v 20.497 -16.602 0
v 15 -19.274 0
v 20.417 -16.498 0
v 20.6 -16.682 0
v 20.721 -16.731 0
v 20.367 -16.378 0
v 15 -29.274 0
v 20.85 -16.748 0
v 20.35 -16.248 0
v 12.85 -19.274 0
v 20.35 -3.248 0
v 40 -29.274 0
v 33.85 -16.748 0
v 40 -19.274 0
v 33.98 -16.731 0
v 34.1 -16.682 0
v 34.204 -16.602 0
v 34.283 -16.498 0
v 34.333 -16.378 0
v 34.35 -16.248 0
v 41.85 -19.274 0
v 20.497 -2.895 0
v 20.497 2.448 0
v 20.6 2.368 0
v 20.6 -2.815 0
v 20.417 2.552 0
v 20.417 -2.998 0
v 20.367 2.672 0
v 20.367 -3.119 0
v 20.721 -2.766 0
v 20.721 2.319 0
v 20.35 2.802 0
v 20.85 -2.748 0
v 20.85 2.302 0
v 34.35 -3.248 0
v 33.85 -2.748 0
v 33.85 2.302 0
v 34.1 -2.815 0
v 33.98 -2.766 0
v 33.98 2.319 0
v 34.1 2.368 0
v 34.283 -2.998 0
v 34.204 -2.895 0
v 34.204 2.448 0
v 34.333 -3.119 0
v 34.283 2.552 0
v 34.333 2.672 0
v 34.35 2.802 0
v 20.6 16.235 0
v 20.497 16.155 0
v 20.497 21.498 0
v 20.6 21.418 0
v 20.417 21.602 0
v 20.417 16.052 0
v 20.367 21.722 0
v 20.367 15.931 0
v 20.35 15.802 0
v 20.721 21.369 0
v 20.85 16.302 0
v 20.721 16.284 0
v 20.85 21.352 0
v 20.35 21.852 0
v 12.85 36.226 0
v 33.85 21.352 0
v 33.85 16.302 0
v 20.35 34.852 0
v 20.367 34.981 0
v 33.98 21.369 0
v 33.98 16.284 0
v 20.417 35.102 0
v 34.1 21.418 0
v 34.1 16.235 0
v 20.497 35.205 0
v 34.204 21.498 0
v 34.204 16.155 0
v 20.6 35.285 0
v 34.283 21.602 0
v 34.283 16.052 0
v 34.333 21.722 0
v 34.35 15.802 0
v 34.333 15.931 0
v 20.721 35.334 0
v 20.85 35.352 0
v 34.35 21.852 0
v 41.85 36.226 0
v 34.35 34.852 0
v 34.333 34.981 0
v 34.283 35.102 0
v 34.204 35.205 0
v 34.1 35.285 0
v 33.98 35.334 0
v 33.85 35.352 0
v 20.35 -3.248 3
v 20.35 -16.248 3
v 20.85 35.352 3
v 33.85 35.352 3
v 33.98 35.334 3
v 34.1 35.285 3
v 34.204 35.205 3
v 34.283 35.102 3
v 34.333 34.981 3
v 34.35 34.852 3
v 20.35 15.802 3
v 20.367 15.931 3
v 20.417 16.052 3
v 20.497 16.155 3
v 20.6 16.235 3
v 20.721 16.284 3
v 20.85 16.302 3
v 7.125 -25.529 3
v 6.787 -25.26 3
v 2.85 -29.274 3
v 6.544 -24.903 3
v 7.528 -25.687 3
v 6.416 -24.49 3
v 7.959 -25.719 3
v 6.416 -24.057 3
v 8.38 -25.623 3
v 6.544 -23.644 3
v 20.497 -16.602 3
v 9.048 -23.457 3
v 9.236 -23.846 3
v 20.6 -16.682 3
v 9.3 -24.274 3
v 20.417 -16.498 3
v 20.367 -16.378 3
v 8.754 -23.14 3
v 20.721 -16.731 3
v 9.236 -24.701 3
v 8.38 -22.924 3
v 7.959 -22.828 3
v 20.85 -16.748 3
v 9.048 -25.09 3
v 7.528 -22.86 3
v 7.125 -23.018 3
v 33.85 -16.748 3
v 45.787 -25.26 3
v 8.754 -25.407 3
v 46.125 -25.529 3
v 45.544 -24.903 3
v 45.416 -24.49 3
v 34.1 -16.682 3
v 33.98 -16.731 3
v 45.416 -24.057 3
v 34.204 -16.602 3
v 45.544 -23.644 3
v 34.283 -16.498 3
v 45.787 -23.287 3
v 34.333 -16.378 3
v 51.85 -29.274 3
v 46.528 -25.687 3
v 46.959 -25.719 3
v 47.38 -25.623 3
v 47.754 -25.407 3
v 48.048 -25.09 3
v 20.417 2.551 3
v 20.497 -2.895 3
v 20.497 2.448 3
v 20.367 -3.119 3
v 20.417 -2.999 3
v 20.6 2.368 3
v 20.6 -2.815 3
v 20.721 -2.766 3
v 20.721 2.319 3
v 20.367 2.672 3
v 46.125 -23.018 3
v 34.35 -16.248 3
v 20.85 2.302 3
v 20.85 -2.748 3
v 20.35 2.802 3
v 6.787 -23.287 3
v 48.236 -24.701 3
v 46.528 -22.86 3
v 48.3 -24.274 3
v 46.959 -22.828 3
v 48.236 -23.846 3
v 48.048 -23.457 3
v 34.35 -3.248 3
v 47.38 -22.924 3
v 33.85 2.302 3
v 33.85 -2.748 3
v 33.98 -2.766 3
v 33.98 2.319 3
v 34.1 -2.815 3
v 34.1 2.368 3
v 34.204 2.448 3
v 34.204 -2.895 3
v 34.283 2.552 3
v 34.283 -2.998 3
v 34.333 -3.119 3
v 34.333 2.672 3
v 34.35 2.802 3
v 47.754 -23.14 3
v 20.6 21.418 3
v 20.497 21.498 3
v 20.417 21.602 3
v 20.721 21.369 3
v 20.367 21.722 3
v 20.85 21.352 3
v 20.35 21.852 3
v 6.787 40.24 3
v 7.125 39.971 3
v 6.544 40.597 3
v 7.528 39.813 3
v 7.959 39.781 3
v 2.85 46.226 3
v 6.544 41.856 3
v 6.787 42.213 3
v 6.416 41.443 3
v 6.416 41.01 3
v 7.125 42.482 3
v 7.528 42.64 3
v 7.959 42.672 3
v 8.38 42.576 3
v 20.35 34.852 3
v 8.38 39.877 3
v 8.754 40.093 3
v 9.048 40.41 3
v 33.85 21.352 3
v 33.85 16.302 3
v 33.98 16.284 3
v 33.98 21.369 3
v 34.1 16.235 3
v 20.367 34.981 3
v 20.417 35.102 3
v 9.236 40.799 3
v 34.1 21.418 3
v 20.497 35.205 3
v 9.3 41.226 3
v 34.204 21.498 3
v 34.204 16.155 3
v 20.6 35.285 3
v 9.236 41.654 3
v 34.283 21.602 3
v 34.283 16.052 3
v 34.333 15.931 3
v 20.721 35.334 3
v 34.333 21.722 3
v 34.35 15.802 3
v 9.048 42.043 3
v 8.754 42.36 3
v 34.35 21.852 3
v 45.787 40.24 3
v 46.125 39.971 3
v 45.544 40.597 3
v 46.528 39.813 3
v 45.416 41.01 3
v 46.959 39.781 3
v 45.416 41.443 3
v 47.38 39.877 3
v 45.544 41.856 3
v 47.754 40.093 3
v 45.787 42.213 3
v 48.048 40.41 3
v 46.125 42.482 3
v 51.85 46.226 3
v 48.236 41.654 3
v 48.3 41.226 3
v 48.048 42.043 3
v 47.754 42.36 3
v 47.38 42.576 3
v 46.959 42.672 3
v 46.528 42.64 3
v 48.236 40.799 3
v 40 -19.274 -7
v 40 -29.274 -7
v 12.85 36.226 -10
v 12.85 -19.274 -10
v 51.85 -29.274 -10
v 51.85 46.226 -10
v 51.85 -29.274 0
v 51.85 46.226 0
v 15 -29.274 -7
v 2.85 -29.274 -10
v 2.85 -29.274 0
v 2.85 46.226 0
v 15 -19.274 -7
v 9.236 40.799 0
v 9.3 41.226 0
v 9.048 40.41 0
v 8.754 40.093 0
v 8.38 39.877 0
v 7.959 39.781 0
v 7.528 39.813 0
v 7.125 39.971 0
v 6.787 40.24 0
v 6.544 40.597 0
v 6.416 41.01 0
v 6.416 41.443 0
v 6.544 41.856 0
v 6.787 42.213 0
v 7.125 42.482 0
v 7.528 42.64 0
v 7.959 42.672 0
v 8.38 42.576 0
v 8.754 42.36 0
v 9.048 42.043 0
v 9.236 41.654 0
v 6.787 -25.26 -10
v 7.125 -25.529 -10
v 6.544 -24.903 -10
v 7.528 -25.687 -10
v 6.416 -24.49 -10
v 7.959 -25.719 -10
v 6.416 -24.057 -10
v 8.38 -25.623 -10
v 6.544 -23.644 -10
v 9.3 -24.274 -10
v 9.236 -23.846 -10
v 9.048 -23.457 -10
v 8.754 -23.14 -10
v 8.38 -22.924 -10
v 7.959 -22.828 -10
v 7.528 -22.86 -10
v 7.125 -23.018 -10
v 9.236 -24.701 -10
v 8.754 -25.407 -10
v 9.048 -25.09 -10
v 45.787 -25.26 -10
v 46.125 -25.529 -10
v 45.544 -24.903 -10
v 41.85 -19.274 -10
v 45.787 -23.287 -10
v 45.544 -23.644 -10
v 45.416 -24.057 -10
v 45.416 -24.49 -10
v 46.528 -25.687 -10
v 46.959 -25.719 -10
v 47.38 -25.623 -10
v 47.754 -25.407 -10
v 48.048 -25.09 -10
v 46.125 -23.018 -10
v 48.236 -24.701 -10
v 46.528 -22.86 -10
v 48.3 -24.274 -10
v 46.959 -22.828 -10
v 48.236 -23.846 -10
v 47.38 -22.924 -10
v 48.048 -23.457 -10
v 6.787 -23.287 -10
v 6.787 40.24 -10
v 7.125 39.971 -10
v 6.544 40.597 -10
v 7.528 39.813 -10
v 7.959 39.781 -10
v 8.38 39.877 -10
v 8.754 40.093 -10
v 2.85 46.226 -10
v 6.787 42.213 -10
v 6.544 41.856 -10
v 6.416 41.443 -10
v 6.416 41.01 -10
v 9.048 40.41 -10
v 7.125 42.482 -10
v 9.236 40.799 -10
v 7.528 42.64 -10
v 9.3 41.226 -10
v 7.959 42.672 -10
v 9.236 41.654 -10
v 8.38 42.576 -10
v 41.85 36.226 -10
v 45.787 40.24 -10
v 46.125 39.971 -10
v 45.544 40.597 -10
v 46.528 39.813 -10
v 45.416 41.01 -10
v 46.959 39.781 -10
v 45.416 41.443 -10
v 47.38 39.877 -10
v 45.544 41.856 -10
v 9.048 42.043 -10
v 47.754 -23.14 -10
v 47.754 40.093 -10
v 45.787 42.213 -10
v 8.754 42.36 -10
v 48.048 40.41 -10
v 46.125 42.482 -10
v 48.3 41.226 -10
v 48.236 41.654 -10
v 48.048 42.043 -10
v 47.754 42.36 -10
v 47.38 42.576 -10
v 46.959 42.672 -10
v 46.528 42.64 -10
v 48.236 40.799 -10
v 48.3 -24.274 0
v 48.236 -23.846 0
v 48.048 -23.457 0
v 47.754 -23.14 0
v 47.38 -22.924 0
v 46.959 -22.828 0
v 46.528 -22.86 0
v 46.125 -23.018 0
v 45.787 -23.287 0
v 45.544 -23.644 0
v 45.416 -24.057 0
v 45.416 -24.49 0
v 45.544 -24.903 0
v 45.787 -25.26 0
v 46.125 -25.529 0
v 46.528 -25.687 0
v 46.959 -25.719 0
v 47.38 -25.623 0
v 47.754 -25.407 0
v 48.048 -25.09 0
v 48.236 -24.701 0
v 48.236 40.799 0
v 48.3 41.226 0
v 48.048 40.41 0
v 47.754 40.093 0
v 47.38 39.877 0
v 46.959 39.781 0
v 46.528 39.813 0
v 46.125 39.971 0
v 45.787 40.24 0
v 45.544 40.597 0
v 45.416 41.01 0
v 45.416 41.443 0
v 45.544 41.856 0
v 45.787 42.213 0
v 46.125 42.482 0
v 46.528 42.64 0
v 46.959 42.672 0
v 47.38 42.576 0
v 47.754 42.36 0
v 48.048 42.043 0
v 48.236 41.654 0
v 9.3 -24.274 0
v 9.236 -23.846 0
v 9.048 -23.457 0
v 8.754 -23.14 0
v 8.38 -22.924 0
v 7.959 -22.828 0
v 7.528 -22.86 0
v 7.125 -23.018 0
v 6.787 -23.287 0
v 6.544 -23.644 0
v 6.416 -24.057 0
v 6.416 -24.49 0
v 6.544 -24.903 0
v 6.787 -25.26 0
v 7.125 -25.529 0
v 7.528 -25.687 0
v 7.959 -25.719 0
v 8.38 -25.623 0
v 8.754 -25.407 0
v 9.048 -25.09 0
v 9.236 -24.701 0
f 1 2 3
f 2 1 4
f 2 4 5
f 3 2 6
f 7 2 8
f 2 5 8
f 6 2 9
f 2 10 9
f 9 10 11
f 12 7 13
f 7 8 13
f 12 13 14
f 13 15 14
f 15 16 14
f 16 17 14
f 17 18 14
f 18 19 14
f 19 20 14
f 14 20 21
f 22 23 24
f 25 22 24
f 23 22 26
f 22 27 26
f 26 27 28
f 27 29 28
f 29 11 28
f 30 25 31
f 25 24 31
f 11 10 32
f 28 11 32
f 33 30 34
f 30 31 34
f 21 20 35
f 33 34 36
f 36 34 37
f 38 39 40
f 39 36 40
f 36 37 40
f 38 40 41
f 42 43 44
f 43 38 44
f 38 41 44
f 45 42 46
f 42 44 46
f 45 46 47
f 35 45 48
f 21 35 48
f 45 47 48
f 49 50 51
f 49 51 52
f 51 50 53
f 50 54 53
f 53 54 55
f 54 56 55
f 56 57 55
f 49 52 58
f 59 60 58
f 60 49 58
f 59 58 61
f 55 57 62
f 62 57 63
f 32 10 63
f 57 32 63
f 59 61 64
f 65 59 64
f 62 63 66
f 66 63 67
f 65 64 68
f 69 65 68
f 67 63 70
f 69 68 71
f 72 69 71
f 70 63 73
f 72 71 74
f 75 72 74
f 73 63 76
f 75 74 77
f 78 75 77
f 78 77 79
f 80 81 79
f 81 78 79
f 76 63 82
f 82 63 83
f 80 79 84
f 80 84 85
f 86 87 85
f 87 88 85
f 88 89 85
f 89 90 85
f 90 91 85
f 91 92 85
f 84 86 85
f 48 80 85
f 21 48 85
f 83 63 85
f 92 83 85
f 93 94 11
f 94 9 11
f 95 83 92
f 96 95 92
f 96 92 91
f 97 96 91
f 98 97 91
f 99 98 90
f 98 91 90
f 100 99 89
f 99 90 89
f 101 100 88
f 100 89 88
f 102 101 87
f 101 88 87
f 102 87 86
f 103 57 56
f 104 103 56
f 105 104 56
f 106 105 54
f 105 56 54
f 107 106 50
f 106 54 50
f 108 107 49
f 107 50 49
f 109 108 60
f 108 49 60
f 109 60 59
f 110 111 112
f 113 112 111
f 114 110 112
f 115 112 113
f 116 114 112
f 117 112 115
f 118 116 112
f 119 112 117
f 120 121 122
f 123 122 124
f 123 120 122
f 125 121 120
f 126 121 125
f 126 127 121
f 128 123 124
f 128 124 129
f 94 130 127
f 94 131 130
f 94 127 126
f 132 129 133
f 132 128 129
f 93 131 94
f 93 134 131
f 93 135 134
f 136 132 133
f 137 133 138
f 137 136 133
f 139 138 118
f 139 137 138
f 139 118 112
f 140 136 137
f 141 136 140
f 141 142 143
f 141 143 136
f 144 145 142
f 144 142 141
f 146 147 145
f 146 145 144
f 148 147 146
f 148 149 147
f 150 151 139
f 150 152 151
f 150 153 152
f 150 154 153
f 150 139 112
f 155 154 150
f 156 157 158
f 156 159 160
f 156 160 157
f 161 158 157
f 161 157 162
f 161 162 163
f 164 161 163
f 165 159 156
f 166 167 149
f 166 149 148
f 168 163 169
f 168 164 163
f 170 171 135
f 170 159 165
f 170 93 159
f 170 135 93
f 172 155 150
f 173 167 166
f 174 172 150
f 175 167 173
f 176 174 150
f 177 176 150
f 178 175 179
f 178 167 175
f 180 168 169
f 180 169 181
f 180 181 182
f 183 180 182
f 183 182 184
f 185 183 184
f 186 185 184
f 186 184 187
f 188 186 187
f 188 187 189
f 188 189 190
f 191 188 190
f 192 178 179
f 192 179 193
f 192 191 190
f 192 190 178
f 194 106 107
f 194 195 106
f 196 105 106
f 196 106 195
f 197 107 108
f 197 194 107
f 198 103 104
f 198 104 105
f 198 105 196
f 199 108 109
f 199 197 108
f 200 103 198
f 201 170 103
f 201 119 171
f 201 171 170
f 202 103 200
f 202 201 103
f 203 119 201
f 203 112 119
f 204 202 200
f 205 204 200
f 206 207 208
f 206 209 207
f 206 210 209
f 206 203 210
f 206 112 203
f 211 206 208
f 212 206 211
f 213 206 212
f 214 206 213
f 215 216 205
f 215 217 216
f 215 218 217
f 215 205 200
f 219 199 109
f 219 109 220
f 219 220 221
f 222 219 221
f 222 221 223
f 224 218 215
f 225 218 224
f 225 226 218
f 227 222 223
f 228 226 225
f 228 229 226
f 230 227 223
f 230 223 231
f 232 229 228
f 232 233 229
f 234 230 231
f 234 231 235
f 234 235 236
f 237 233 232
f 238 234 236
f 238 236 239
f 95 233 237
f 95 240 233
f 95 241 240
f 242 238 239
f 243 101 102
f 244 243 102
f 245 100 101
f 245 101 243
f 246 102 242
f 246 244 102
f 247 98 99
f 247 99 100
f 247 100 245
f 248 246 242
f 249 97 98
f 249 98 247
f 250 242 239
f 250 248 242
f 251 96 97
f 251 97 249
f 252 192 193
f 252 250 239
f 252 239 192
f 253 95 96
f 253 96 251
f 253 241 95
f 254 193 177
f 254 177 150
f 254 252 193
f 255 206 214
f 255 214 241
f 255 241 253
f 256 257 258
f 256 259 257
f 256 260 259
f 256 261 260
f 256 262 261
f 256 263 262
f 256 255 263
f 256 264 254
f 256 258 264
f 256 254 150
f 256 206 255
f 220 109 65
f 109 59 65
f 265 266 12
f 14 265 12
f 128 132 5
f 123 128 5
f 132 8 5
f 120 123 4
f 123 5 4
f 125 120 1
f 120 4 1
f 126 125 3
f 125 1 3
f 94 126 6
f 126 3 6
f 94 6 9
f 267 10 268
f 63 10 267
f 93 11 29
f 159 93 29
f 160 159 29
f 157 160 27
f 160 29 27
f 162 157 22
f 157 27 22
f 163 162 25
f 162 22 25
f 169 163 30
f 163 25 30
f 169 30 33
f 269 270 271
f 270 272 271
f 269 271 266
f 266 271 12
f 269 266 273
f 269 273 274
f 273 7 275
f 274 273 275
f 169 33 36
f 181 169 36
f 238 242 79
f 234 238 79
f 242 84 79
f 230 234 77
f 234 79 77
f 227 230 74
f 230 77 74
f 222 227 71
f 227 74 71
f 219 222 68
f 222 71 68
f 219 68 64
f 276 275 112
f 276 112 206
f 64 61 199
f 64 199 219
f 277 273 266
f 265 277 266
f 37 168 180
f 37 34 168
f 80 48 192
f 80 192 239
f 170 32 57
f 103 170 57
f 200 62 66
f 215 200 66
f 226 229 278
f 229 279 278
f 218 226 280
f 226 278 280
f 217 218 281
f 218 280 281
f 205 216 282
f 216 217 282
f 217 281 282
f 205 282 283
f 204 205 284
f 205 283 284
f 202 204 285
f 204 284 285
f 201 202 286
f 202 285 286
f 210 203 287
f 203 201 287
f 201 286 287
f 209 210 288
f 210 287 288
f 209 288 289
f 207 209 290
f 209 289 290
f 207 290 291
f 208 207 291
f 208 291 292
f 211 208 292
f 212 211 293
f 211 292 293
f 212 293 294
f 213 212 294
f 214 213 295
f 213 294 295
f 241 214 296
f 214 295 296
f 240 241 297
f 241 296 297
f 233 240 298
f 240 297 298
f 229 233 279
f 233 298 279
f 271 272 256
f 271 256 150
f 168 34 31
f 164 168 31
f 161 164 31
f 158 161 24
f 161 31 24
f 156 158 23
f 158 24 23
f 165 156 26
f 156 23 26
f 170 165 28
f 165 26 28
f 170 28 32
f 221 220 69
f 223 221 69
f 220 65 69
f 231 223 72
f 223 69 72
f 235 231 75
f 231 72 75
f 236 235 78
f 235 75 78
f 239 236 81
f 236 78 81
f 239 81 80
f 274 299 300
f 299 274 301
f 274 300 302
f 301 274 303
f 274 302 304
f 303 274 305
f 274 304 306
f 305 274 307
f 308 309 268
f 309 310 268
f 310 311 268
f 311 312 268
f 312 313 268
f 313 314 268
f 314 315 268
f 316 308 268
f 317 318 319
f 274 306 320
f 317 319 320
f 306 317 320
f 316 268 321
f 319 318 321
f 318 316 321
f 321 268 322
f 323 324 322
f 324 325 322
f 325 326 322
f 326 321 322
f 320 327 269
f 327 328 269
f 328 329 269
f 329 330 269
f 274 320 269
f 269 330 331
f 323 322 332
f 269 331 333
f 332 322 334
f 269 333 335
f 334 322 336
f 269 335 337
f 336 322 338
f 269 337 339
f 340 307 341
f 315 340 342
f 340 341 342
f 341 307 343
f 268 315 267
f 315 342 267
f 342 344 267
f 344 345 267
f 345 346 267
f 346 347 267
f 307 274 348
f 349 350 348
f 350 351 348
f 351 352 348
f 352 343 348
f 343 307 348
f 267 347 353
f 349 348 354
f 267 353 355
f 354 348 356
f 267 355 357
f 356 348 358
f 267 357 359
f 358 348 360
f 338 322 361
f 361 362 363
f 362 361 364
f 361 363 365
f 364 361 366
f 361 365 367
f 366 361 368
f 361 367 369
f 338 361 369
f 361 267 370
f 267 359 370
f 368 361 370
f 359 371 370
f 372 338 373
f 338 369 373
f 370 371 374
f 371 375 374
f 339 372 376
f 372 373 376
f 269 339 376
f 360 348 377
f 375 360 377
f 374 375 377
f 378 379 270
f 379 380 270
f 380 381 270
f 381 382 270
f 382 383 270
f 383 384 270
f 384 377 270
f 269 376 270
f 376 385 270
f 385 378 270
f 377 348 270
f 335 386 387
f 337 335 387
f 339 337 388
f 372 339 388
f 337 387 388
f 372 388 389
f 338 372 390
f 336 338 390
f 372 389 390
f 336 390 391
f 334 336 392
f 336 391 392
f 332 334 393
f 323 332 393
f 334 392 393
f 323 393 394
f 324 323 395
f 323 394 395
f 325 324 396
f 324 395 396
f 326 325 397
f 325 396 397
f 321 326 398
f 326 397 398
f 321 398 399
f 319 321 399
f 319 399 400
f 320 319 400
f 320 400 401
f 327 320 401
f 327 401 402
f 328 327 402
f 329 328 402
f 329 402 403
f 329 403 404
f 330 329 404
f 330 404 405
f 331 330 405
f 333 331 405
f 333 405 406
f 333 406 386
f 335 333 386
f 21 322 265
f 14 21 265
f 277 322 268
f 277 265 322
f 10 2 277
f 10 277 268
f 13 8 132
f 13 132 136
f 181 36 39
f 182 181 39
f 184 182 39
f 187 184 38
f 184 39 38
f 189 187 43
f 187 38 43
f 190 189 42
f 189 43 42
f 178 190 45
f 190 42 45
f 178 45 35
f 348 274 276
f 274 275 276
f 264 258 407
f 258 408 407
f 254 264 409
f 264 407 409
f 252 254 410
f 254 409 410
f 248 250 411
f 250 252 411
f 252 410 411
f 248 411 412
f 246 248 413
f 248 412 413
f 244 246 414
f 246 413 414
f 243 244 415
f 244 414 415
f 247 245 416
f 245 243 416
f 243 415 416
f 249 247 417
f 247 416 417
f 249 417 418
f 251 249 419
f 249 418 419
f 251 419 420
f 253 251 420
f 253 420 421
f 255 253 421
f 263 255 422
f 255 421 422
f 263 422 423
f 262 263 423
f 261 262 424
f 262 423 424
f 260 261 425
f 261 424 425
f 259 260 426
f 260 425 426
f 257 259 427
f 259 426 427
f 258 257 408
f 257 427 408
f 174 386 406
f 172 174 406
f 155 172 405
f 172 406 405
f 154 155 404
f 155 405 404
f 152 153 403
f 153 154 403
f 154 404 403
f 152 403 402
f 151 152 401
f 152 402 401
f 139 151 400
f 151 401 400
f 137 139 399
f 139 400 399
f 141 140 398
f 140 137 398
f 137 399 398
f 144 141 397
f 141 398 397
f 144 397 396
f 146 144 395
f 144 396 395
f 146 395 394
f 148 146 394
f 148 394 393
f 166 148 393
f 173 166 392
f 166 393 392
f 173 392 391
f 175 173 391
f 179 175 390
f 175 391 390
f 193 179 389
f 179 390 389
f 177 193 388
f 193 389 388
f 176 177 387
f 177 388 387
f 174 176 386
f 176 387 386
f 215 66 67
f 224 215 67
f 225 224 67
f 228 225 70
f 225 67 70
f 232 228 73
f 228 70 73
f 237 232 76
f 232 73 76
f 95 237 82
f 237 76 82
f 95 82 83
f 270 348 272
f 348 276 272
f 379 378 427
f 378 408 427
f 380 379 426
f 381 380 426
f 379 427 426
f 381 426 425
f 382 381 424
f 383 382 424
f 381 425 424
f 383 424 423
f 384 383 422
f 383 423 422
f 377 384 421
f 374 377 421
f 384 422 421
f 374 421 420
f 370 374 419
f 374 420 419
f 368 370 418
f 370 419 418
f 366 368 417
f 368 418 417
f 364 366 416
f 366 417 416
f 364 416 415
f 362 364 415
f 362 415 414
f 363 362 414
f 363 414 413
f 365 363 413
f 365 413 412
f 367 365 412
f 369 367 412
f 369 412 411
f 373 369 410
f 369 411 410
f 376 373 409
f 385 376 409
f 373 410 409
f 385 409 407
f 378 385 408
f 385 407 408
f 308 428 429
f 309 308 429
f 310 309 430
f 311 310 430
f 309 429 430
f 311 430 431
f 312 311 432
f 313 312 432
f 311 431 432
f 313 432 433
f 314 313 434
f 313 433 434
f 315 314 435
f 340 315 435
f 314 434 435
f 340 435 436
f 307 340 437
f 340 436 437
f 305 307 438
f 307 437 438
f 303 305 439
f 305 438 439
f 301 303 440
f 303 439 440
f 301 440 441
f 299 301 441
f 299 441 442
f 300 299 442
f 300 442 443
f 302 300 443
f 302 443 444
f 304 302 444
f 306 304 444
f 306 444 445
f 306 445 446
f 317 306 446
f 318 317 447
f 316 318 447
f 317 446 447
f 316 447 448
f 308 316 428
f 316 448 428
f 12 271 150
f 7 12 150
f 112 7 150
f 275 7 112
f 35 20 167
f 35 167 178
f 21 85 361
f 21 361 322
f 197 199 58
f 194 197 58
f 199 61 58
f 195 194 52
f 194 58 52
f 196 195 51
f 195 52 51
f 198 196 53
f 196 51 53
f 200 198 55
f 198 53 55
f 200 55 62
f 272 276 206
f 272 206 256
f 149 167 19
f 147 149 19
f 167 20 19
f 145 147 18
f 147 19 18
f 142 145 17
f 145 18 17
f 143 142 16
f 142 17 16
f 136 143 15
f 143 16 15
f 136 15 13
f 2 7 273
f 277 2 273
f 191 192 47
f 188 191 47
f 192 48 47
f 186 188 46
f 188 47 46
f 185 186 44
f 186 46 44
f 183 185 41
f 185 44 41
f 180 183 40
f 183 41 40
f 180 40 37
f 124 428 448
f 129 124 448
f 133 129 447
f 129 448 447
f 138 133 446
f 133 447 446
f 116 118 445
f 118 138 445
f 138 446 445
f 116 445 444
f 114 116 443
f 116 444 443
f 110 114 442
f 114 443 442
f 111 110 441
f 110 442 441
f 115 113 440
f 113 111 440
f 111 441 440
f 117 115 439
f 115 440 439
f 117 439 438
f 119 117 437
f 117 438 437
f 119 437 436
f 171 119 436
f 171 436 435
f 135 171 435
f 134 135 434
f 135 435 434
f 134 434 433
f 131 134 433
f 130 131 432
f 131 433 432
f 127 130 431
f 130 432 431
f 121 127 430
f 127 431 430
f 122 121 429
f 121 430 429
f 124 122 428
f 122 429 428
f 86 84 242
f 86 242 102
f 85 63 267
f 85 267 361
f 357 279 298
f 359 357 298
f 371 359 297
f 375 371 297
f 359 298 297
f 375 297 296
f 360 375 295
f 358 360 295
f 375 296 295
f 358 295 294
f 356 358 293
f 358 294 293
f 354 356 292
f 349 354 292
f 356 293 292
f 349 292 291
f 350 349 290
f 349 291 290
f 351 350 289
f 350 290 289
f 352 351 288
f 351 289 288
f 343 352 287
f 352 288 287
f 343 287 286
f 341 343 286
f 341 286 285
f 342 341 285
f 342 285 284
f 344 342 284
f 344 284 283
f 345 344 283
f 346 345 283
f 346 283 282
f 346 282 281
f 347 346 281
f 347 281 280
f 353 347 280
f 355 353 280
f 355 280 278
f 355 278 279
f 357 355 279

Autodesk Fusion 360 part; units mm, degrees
sketch "Sketch1" plane through (0, 0, 0) normal (0, 0, 1) x (1, 0, 0)
  line L0 (12.8502, 36.2265) -> (41.8502, 36.2265)
  line L1 (41.8502, 36.2265) -> (41.8502, -19.2735)
  line L2 (41.8502, -19.2735) -> (12.8502, -19.2735)
  line L3 (12.8502, -19.2735) -> (12.8502, 36.2265)
  line L4 (51.8502, 46.2265) -> (51.8502, -29.2735)
  line L5 (51.8502, -29.2735) -> (2.8502, -29.2735)
  line L6 (2.8502, -29.2735) -> (2.8502, 46.2265)
  line L7 (2.8502, 46.2265) -> (51.8502, 46.2265)
  line L8 (51.8502, -29.2735) -> (46.8502, -29.2735)
  line L9 (46.8502, -29.2735) -> (46.8502, 46.2265)
  line L10 (51.8502, -29.2735) -> (51.8502, -24.2735)
  line L11 (51.8502, -24.2735) -> (2.8502, -24.2735)
  line L12 (2.8502, -29.2735) -> (7.8502, -29.2735)
  line L13 (7.8502, -29.2735) -> (7.8502, 46.2265)
  line L14 (2.8502, 46.2265) -> (2.8502, 41.2265)
  line L15 (2.8502, 41.2265) -> (51.8502, 41.2265)
  circle A0 centre (46.8502, -24.2735) radius 1.45
  circle A1 centre (7.8502, -24.2735) radius 1.45
  circle A2 centre (46.8502, 41.2265) radius 1.45
  circle A3 centre (7.8502, 41.2265) radius 1.45
  line L16 (41.8502, -19.2735) -> (27.3502, -19.2735)
  line L17 (36.8752, -19.2735) -> (36.8752, 37.8765)
  line L18 (34.3502, 2.8015) -> (34.3502, 15.8015)
  line L19 (20.3502, 2.8015) -> (20.3502, 15.8015)
  line L20 (17.8252, -19.2735) -> (17.8252, 37.8765)
  line L21 (17.8252, -19.2735) -> (17.8252, 37.8765)
  line L22 (34.3502, 2.8015) -> (34.3502, 15.8015)
  line L23 (20.3502, 2.8015) -> (20.3502, 15.8015)
  line L24 (34.3502, -16.2485) -> (34.3502, -3.2485)
  arc A4 (20.3502, 2.8015) -> (20.8502, 2.3015) centre (20.8502, 2.8015) ccw
  arc A5 (34.3502, 34.8515) -> (33.8502, 35.3515) centre (33.8502, 34.8515) ccw
  line L25 (36.8752, -19.2735) -> (36.8752, 37.8765)
  arc A6 (20.3502, -16.2485) -> (20.8502, -16.7485) centre (20.8502, -16.2485) ccw
  arc A7 (33.8502, -16.7485) -> (34.3502, -16.2485) centre (33.8502, -16.2485) ccw
  line L26 (20.8502, -2.7485) -> (33.8502, -2.7485)
  line L27 (36.8752, -19.2735) -> (17.8252, -19.2735)
  line L28 (20.8502, 21.3515) -> (33.8502, 21.3515)
  arc A8 (33.8502, -16.7485) -> (34.3502, -16.2485) centre (33.8502, -16.2485) ccw
  line L29 (34.3502, -16.2485) -> (34.3502, -3.2485)
  line L30 (20.8502, 35.3515) -> (33.8502, 35.3515)
  line L31 (36.8752, 37.8765) -> (17.8252, 37.8765)
  line L32 (20.8502, 35.3515) -> (33.8502, 35.3515)
  arc A9 (20.8502, -2.7485) -> (20.3502, -3.2485) centre (20.8502, -3.2485) ccw
  line L33 (20.8502, 2.3015) -> (33.8502, 2.3015)
  arc A10 (20.3502, 21.8515) -> (20.8502, 21.3515) centre (20.8502, 21.8515) ccw
  arc A11 (33.8502, 2.3015) -> (34.3502, 2.8015) centre (33.8502, 2.8015) ccw
  arc A12 (20.8502, -2.7485) -> (20.3502, -3.2485) centre (20.8502, -3.2485) ccw
  line L34 (20.3502, -16.2485) -> (20.3502, -3.2485)
  line L35 (20.8502, -2.7485) -> (33.8502, -2.7485)
  arc A13 (34.3502, -3.2485) -> (33.8502, -2.7485) centre (33.8502, -3.2485) ccw
  line L36 (20.3502, 21.8515) -> (20.3502, 34.8515)
  arc A14 (34.3502, 34.8515) -> (33.8502, 35.3515) centre (33.8502, 34.8515) ccw
  arc A15 (20.3502, 21.8515) -> (20.8502, 21.3515) centre (20.8502, 21.8515) ccw
  arc A16 (20.3502, -16.2485) -> (20.8502, -16.7485) centre (20.8502, -16.2485) ccw
  line L37 (36.8752, -19.2735) -> (17.8252, -19.2735)
  line L38 (36.8752, 37.8765) -> (17.8252, 37.8765)
  arc A17 (20.3502, 2.8015) -> (20.8502, 2.3015) centre (20.8502, 2.8015) ccw
  line L39 (20.3502, -16.2485) -> (20.3502, -3.2485)
  arc A18 (34.3502, -3.2485) -> (33.8502, -2.7485) centre (33.8502, -3.2485) ccw
  arc A19 (34.3502, 15.8015) -> (33.8502, 16.3015) centre (33.8502, 15.8015) ccw
  arc A20 (20.8502, 35.3515) -> (20.3502, 34.8515) centre (20.8502, 34.8515) ccw
  arc A21 (34.3502, 15.8015) -> (33.8502, 16.3015) centre (33.8502, 15.8015) ccw
  line L40 (34.3502, 21.8515) -> (34.3502, 34.8515)
  line L41 (20.8502, -16.7485) -> (33.8502, -16.7485)
  line L42 (20.8502, 21.3515) -> (33.8502, 21.3515)
  line L43 (20.3502, 21.8515) -> (20.3502, 34.8515)
  line L44 (20.8502, 2.3015) -> (33.8502, 2.3015)
  line L45 (34.3502, 21.8515) -> (34.3502, 34.8515)
  arc A22 (33.8502, 2.3015) -> (34.3502, 2.8015) centre (33.8502, 2.8015) ccw
  arc A23 (20.8502, 35.3515) -> (20.3502, 34.8515) centre (20.8502, 34.8515) ccw
  line L46 (20.8502, -16.7485) -> (33.8502, -16.7485)
  arc A24 (20.8502, 16.3015) -> (20.3502, 15.8015) centre (20.8502, 15.8015) ccw
  arc A25 (33.8502, 21.3515) -> (34.3502, 21.8515) centre (33.8502, 21.8515) ccw
  line L47 (20.8502, 16.3015) -> (33.8502, 16.3015)
  arc A26 (33.8502, 21.3515) -> (34.3502, 21.8515) centre (33.8502, 21.8515) ccw
  arc A27 (20.8502, 16.3015) -> (20.3502, 15.8015) centre (20.8502, 15.8015) ccw
  line L48 (20.8502, 16.3015) -> (33.8502, 16.3015)
  line L49 (36.8752, -19.2735) -> (28.3002, -19.2735)
  line L50 (36.8752, -19.2735) -> (27.3502, -19.2735)
  dimension "d1" = 29
  dimension "d2" = 55.5
  dimension "d3" = -10
  dimension "d4" = 5
  dimension "d5" = 5
  dimension "d6" = 5
  dimension "d7" = 5
  dimension "d8" = 2.9
  dimension "d9" = 2.9
  dimension "d10" = 2.9
  dimension "d11" = 2.9
extrude "Extrude1" add sketch "Sketch1" along normal blind 3 contours L0 L2 L3 L20 L21 | L0 L17 L20 L21 L25 L31 L38 | L0 L2 L16 L17 L20 L21 L25 L27 L37 L49 L50 | L0 L1 L2 L16 L17 L25 | L4 L7 L9 L15 A2 | L4 L9 L11 L15 A0 A2 | L7 L9 L13 L15 A2 A3 | L4 L5 L8 L9 L10 L11 A0 | L6 L7 L13 L14 L15 A3 | L9 L11 L13 L15 A0 A1 A2 A3 | L5 L9 L11 L13 A0 A1 | L6 L11 L13 L15 A1 A3 | L5 L6 L11 L12 L13 A1 | L18 L19 L22 L23 A4 L33 A11 A17 A19 A21 L44 A22 A24 L47 A27 L48 | L24 A6 A7 L26 A8 L29 A9 A12 L34 L35 A13 A16 L39 A18 L41 L46 | A5 L28 L30 L32 A10 L36 A14 A15 A20 L40 L42 L43 L45 A23 A25 A26
extrude "Extrude2" add sketch "Sketch1" against normal blind 10 contours L0 L17 L20 L21 L25 L31 L38 | L4 L7 L9 L15 A2 | L4 L9 L11 L15 A0 A2 | L7 L9 L13 L15 A2 A3 | L4 L5 L8 L9 L10 L11 A0 | L6 L7 L13 L14 L15 A3 | L9 L11 L13 L15 A0 A1 A2 A3 | L5 L9 L11 L13 A0 A1 | L6 L11 L13 L15 A1 A3 | L5 L6 L11 L12 L13 A1
extrude "Extrude3" cut sketch "Sketch1" along normal blind 10 contours L18 L19 L22 L23 A4 L33 A11 A17 A19 A21 L44 A22 A24 L47 A27 L48 | L24 A6 A7 L26 A8 L29 A9 A12 L34 L35 A13 A16 L39 A18 L41 L46 | A5 L28 L30 L32 A10 L36 A14 A15 A20 L40 L42 L43 L45 A23 A25 A26
sketch "Sketch3" plane through (0, -29.2735, 0) normal (0, -1, 0) x (1, 0, 0)
  line L0 (51.8502, -10) -> (51.8502, 3)
  line L1 (51.8502, 3) -> (2.8502, 3)
  line L2 (2.8502, 3) -> (2.8502, -10)
  line L3 (2.8502, -10) -> (51.8502, -10)
  line L4 (40, 0) -> (15, 0)
  line L5 (15, 0) -> (15, -7)
  line L6 (15, -7) -> (40, -7)
  line L7 (40, -7) -> (40, 0)
extrude "Extrude4" cut sketch "Sketch3" against normal blind 19 contours L4 L5 L6 L7
